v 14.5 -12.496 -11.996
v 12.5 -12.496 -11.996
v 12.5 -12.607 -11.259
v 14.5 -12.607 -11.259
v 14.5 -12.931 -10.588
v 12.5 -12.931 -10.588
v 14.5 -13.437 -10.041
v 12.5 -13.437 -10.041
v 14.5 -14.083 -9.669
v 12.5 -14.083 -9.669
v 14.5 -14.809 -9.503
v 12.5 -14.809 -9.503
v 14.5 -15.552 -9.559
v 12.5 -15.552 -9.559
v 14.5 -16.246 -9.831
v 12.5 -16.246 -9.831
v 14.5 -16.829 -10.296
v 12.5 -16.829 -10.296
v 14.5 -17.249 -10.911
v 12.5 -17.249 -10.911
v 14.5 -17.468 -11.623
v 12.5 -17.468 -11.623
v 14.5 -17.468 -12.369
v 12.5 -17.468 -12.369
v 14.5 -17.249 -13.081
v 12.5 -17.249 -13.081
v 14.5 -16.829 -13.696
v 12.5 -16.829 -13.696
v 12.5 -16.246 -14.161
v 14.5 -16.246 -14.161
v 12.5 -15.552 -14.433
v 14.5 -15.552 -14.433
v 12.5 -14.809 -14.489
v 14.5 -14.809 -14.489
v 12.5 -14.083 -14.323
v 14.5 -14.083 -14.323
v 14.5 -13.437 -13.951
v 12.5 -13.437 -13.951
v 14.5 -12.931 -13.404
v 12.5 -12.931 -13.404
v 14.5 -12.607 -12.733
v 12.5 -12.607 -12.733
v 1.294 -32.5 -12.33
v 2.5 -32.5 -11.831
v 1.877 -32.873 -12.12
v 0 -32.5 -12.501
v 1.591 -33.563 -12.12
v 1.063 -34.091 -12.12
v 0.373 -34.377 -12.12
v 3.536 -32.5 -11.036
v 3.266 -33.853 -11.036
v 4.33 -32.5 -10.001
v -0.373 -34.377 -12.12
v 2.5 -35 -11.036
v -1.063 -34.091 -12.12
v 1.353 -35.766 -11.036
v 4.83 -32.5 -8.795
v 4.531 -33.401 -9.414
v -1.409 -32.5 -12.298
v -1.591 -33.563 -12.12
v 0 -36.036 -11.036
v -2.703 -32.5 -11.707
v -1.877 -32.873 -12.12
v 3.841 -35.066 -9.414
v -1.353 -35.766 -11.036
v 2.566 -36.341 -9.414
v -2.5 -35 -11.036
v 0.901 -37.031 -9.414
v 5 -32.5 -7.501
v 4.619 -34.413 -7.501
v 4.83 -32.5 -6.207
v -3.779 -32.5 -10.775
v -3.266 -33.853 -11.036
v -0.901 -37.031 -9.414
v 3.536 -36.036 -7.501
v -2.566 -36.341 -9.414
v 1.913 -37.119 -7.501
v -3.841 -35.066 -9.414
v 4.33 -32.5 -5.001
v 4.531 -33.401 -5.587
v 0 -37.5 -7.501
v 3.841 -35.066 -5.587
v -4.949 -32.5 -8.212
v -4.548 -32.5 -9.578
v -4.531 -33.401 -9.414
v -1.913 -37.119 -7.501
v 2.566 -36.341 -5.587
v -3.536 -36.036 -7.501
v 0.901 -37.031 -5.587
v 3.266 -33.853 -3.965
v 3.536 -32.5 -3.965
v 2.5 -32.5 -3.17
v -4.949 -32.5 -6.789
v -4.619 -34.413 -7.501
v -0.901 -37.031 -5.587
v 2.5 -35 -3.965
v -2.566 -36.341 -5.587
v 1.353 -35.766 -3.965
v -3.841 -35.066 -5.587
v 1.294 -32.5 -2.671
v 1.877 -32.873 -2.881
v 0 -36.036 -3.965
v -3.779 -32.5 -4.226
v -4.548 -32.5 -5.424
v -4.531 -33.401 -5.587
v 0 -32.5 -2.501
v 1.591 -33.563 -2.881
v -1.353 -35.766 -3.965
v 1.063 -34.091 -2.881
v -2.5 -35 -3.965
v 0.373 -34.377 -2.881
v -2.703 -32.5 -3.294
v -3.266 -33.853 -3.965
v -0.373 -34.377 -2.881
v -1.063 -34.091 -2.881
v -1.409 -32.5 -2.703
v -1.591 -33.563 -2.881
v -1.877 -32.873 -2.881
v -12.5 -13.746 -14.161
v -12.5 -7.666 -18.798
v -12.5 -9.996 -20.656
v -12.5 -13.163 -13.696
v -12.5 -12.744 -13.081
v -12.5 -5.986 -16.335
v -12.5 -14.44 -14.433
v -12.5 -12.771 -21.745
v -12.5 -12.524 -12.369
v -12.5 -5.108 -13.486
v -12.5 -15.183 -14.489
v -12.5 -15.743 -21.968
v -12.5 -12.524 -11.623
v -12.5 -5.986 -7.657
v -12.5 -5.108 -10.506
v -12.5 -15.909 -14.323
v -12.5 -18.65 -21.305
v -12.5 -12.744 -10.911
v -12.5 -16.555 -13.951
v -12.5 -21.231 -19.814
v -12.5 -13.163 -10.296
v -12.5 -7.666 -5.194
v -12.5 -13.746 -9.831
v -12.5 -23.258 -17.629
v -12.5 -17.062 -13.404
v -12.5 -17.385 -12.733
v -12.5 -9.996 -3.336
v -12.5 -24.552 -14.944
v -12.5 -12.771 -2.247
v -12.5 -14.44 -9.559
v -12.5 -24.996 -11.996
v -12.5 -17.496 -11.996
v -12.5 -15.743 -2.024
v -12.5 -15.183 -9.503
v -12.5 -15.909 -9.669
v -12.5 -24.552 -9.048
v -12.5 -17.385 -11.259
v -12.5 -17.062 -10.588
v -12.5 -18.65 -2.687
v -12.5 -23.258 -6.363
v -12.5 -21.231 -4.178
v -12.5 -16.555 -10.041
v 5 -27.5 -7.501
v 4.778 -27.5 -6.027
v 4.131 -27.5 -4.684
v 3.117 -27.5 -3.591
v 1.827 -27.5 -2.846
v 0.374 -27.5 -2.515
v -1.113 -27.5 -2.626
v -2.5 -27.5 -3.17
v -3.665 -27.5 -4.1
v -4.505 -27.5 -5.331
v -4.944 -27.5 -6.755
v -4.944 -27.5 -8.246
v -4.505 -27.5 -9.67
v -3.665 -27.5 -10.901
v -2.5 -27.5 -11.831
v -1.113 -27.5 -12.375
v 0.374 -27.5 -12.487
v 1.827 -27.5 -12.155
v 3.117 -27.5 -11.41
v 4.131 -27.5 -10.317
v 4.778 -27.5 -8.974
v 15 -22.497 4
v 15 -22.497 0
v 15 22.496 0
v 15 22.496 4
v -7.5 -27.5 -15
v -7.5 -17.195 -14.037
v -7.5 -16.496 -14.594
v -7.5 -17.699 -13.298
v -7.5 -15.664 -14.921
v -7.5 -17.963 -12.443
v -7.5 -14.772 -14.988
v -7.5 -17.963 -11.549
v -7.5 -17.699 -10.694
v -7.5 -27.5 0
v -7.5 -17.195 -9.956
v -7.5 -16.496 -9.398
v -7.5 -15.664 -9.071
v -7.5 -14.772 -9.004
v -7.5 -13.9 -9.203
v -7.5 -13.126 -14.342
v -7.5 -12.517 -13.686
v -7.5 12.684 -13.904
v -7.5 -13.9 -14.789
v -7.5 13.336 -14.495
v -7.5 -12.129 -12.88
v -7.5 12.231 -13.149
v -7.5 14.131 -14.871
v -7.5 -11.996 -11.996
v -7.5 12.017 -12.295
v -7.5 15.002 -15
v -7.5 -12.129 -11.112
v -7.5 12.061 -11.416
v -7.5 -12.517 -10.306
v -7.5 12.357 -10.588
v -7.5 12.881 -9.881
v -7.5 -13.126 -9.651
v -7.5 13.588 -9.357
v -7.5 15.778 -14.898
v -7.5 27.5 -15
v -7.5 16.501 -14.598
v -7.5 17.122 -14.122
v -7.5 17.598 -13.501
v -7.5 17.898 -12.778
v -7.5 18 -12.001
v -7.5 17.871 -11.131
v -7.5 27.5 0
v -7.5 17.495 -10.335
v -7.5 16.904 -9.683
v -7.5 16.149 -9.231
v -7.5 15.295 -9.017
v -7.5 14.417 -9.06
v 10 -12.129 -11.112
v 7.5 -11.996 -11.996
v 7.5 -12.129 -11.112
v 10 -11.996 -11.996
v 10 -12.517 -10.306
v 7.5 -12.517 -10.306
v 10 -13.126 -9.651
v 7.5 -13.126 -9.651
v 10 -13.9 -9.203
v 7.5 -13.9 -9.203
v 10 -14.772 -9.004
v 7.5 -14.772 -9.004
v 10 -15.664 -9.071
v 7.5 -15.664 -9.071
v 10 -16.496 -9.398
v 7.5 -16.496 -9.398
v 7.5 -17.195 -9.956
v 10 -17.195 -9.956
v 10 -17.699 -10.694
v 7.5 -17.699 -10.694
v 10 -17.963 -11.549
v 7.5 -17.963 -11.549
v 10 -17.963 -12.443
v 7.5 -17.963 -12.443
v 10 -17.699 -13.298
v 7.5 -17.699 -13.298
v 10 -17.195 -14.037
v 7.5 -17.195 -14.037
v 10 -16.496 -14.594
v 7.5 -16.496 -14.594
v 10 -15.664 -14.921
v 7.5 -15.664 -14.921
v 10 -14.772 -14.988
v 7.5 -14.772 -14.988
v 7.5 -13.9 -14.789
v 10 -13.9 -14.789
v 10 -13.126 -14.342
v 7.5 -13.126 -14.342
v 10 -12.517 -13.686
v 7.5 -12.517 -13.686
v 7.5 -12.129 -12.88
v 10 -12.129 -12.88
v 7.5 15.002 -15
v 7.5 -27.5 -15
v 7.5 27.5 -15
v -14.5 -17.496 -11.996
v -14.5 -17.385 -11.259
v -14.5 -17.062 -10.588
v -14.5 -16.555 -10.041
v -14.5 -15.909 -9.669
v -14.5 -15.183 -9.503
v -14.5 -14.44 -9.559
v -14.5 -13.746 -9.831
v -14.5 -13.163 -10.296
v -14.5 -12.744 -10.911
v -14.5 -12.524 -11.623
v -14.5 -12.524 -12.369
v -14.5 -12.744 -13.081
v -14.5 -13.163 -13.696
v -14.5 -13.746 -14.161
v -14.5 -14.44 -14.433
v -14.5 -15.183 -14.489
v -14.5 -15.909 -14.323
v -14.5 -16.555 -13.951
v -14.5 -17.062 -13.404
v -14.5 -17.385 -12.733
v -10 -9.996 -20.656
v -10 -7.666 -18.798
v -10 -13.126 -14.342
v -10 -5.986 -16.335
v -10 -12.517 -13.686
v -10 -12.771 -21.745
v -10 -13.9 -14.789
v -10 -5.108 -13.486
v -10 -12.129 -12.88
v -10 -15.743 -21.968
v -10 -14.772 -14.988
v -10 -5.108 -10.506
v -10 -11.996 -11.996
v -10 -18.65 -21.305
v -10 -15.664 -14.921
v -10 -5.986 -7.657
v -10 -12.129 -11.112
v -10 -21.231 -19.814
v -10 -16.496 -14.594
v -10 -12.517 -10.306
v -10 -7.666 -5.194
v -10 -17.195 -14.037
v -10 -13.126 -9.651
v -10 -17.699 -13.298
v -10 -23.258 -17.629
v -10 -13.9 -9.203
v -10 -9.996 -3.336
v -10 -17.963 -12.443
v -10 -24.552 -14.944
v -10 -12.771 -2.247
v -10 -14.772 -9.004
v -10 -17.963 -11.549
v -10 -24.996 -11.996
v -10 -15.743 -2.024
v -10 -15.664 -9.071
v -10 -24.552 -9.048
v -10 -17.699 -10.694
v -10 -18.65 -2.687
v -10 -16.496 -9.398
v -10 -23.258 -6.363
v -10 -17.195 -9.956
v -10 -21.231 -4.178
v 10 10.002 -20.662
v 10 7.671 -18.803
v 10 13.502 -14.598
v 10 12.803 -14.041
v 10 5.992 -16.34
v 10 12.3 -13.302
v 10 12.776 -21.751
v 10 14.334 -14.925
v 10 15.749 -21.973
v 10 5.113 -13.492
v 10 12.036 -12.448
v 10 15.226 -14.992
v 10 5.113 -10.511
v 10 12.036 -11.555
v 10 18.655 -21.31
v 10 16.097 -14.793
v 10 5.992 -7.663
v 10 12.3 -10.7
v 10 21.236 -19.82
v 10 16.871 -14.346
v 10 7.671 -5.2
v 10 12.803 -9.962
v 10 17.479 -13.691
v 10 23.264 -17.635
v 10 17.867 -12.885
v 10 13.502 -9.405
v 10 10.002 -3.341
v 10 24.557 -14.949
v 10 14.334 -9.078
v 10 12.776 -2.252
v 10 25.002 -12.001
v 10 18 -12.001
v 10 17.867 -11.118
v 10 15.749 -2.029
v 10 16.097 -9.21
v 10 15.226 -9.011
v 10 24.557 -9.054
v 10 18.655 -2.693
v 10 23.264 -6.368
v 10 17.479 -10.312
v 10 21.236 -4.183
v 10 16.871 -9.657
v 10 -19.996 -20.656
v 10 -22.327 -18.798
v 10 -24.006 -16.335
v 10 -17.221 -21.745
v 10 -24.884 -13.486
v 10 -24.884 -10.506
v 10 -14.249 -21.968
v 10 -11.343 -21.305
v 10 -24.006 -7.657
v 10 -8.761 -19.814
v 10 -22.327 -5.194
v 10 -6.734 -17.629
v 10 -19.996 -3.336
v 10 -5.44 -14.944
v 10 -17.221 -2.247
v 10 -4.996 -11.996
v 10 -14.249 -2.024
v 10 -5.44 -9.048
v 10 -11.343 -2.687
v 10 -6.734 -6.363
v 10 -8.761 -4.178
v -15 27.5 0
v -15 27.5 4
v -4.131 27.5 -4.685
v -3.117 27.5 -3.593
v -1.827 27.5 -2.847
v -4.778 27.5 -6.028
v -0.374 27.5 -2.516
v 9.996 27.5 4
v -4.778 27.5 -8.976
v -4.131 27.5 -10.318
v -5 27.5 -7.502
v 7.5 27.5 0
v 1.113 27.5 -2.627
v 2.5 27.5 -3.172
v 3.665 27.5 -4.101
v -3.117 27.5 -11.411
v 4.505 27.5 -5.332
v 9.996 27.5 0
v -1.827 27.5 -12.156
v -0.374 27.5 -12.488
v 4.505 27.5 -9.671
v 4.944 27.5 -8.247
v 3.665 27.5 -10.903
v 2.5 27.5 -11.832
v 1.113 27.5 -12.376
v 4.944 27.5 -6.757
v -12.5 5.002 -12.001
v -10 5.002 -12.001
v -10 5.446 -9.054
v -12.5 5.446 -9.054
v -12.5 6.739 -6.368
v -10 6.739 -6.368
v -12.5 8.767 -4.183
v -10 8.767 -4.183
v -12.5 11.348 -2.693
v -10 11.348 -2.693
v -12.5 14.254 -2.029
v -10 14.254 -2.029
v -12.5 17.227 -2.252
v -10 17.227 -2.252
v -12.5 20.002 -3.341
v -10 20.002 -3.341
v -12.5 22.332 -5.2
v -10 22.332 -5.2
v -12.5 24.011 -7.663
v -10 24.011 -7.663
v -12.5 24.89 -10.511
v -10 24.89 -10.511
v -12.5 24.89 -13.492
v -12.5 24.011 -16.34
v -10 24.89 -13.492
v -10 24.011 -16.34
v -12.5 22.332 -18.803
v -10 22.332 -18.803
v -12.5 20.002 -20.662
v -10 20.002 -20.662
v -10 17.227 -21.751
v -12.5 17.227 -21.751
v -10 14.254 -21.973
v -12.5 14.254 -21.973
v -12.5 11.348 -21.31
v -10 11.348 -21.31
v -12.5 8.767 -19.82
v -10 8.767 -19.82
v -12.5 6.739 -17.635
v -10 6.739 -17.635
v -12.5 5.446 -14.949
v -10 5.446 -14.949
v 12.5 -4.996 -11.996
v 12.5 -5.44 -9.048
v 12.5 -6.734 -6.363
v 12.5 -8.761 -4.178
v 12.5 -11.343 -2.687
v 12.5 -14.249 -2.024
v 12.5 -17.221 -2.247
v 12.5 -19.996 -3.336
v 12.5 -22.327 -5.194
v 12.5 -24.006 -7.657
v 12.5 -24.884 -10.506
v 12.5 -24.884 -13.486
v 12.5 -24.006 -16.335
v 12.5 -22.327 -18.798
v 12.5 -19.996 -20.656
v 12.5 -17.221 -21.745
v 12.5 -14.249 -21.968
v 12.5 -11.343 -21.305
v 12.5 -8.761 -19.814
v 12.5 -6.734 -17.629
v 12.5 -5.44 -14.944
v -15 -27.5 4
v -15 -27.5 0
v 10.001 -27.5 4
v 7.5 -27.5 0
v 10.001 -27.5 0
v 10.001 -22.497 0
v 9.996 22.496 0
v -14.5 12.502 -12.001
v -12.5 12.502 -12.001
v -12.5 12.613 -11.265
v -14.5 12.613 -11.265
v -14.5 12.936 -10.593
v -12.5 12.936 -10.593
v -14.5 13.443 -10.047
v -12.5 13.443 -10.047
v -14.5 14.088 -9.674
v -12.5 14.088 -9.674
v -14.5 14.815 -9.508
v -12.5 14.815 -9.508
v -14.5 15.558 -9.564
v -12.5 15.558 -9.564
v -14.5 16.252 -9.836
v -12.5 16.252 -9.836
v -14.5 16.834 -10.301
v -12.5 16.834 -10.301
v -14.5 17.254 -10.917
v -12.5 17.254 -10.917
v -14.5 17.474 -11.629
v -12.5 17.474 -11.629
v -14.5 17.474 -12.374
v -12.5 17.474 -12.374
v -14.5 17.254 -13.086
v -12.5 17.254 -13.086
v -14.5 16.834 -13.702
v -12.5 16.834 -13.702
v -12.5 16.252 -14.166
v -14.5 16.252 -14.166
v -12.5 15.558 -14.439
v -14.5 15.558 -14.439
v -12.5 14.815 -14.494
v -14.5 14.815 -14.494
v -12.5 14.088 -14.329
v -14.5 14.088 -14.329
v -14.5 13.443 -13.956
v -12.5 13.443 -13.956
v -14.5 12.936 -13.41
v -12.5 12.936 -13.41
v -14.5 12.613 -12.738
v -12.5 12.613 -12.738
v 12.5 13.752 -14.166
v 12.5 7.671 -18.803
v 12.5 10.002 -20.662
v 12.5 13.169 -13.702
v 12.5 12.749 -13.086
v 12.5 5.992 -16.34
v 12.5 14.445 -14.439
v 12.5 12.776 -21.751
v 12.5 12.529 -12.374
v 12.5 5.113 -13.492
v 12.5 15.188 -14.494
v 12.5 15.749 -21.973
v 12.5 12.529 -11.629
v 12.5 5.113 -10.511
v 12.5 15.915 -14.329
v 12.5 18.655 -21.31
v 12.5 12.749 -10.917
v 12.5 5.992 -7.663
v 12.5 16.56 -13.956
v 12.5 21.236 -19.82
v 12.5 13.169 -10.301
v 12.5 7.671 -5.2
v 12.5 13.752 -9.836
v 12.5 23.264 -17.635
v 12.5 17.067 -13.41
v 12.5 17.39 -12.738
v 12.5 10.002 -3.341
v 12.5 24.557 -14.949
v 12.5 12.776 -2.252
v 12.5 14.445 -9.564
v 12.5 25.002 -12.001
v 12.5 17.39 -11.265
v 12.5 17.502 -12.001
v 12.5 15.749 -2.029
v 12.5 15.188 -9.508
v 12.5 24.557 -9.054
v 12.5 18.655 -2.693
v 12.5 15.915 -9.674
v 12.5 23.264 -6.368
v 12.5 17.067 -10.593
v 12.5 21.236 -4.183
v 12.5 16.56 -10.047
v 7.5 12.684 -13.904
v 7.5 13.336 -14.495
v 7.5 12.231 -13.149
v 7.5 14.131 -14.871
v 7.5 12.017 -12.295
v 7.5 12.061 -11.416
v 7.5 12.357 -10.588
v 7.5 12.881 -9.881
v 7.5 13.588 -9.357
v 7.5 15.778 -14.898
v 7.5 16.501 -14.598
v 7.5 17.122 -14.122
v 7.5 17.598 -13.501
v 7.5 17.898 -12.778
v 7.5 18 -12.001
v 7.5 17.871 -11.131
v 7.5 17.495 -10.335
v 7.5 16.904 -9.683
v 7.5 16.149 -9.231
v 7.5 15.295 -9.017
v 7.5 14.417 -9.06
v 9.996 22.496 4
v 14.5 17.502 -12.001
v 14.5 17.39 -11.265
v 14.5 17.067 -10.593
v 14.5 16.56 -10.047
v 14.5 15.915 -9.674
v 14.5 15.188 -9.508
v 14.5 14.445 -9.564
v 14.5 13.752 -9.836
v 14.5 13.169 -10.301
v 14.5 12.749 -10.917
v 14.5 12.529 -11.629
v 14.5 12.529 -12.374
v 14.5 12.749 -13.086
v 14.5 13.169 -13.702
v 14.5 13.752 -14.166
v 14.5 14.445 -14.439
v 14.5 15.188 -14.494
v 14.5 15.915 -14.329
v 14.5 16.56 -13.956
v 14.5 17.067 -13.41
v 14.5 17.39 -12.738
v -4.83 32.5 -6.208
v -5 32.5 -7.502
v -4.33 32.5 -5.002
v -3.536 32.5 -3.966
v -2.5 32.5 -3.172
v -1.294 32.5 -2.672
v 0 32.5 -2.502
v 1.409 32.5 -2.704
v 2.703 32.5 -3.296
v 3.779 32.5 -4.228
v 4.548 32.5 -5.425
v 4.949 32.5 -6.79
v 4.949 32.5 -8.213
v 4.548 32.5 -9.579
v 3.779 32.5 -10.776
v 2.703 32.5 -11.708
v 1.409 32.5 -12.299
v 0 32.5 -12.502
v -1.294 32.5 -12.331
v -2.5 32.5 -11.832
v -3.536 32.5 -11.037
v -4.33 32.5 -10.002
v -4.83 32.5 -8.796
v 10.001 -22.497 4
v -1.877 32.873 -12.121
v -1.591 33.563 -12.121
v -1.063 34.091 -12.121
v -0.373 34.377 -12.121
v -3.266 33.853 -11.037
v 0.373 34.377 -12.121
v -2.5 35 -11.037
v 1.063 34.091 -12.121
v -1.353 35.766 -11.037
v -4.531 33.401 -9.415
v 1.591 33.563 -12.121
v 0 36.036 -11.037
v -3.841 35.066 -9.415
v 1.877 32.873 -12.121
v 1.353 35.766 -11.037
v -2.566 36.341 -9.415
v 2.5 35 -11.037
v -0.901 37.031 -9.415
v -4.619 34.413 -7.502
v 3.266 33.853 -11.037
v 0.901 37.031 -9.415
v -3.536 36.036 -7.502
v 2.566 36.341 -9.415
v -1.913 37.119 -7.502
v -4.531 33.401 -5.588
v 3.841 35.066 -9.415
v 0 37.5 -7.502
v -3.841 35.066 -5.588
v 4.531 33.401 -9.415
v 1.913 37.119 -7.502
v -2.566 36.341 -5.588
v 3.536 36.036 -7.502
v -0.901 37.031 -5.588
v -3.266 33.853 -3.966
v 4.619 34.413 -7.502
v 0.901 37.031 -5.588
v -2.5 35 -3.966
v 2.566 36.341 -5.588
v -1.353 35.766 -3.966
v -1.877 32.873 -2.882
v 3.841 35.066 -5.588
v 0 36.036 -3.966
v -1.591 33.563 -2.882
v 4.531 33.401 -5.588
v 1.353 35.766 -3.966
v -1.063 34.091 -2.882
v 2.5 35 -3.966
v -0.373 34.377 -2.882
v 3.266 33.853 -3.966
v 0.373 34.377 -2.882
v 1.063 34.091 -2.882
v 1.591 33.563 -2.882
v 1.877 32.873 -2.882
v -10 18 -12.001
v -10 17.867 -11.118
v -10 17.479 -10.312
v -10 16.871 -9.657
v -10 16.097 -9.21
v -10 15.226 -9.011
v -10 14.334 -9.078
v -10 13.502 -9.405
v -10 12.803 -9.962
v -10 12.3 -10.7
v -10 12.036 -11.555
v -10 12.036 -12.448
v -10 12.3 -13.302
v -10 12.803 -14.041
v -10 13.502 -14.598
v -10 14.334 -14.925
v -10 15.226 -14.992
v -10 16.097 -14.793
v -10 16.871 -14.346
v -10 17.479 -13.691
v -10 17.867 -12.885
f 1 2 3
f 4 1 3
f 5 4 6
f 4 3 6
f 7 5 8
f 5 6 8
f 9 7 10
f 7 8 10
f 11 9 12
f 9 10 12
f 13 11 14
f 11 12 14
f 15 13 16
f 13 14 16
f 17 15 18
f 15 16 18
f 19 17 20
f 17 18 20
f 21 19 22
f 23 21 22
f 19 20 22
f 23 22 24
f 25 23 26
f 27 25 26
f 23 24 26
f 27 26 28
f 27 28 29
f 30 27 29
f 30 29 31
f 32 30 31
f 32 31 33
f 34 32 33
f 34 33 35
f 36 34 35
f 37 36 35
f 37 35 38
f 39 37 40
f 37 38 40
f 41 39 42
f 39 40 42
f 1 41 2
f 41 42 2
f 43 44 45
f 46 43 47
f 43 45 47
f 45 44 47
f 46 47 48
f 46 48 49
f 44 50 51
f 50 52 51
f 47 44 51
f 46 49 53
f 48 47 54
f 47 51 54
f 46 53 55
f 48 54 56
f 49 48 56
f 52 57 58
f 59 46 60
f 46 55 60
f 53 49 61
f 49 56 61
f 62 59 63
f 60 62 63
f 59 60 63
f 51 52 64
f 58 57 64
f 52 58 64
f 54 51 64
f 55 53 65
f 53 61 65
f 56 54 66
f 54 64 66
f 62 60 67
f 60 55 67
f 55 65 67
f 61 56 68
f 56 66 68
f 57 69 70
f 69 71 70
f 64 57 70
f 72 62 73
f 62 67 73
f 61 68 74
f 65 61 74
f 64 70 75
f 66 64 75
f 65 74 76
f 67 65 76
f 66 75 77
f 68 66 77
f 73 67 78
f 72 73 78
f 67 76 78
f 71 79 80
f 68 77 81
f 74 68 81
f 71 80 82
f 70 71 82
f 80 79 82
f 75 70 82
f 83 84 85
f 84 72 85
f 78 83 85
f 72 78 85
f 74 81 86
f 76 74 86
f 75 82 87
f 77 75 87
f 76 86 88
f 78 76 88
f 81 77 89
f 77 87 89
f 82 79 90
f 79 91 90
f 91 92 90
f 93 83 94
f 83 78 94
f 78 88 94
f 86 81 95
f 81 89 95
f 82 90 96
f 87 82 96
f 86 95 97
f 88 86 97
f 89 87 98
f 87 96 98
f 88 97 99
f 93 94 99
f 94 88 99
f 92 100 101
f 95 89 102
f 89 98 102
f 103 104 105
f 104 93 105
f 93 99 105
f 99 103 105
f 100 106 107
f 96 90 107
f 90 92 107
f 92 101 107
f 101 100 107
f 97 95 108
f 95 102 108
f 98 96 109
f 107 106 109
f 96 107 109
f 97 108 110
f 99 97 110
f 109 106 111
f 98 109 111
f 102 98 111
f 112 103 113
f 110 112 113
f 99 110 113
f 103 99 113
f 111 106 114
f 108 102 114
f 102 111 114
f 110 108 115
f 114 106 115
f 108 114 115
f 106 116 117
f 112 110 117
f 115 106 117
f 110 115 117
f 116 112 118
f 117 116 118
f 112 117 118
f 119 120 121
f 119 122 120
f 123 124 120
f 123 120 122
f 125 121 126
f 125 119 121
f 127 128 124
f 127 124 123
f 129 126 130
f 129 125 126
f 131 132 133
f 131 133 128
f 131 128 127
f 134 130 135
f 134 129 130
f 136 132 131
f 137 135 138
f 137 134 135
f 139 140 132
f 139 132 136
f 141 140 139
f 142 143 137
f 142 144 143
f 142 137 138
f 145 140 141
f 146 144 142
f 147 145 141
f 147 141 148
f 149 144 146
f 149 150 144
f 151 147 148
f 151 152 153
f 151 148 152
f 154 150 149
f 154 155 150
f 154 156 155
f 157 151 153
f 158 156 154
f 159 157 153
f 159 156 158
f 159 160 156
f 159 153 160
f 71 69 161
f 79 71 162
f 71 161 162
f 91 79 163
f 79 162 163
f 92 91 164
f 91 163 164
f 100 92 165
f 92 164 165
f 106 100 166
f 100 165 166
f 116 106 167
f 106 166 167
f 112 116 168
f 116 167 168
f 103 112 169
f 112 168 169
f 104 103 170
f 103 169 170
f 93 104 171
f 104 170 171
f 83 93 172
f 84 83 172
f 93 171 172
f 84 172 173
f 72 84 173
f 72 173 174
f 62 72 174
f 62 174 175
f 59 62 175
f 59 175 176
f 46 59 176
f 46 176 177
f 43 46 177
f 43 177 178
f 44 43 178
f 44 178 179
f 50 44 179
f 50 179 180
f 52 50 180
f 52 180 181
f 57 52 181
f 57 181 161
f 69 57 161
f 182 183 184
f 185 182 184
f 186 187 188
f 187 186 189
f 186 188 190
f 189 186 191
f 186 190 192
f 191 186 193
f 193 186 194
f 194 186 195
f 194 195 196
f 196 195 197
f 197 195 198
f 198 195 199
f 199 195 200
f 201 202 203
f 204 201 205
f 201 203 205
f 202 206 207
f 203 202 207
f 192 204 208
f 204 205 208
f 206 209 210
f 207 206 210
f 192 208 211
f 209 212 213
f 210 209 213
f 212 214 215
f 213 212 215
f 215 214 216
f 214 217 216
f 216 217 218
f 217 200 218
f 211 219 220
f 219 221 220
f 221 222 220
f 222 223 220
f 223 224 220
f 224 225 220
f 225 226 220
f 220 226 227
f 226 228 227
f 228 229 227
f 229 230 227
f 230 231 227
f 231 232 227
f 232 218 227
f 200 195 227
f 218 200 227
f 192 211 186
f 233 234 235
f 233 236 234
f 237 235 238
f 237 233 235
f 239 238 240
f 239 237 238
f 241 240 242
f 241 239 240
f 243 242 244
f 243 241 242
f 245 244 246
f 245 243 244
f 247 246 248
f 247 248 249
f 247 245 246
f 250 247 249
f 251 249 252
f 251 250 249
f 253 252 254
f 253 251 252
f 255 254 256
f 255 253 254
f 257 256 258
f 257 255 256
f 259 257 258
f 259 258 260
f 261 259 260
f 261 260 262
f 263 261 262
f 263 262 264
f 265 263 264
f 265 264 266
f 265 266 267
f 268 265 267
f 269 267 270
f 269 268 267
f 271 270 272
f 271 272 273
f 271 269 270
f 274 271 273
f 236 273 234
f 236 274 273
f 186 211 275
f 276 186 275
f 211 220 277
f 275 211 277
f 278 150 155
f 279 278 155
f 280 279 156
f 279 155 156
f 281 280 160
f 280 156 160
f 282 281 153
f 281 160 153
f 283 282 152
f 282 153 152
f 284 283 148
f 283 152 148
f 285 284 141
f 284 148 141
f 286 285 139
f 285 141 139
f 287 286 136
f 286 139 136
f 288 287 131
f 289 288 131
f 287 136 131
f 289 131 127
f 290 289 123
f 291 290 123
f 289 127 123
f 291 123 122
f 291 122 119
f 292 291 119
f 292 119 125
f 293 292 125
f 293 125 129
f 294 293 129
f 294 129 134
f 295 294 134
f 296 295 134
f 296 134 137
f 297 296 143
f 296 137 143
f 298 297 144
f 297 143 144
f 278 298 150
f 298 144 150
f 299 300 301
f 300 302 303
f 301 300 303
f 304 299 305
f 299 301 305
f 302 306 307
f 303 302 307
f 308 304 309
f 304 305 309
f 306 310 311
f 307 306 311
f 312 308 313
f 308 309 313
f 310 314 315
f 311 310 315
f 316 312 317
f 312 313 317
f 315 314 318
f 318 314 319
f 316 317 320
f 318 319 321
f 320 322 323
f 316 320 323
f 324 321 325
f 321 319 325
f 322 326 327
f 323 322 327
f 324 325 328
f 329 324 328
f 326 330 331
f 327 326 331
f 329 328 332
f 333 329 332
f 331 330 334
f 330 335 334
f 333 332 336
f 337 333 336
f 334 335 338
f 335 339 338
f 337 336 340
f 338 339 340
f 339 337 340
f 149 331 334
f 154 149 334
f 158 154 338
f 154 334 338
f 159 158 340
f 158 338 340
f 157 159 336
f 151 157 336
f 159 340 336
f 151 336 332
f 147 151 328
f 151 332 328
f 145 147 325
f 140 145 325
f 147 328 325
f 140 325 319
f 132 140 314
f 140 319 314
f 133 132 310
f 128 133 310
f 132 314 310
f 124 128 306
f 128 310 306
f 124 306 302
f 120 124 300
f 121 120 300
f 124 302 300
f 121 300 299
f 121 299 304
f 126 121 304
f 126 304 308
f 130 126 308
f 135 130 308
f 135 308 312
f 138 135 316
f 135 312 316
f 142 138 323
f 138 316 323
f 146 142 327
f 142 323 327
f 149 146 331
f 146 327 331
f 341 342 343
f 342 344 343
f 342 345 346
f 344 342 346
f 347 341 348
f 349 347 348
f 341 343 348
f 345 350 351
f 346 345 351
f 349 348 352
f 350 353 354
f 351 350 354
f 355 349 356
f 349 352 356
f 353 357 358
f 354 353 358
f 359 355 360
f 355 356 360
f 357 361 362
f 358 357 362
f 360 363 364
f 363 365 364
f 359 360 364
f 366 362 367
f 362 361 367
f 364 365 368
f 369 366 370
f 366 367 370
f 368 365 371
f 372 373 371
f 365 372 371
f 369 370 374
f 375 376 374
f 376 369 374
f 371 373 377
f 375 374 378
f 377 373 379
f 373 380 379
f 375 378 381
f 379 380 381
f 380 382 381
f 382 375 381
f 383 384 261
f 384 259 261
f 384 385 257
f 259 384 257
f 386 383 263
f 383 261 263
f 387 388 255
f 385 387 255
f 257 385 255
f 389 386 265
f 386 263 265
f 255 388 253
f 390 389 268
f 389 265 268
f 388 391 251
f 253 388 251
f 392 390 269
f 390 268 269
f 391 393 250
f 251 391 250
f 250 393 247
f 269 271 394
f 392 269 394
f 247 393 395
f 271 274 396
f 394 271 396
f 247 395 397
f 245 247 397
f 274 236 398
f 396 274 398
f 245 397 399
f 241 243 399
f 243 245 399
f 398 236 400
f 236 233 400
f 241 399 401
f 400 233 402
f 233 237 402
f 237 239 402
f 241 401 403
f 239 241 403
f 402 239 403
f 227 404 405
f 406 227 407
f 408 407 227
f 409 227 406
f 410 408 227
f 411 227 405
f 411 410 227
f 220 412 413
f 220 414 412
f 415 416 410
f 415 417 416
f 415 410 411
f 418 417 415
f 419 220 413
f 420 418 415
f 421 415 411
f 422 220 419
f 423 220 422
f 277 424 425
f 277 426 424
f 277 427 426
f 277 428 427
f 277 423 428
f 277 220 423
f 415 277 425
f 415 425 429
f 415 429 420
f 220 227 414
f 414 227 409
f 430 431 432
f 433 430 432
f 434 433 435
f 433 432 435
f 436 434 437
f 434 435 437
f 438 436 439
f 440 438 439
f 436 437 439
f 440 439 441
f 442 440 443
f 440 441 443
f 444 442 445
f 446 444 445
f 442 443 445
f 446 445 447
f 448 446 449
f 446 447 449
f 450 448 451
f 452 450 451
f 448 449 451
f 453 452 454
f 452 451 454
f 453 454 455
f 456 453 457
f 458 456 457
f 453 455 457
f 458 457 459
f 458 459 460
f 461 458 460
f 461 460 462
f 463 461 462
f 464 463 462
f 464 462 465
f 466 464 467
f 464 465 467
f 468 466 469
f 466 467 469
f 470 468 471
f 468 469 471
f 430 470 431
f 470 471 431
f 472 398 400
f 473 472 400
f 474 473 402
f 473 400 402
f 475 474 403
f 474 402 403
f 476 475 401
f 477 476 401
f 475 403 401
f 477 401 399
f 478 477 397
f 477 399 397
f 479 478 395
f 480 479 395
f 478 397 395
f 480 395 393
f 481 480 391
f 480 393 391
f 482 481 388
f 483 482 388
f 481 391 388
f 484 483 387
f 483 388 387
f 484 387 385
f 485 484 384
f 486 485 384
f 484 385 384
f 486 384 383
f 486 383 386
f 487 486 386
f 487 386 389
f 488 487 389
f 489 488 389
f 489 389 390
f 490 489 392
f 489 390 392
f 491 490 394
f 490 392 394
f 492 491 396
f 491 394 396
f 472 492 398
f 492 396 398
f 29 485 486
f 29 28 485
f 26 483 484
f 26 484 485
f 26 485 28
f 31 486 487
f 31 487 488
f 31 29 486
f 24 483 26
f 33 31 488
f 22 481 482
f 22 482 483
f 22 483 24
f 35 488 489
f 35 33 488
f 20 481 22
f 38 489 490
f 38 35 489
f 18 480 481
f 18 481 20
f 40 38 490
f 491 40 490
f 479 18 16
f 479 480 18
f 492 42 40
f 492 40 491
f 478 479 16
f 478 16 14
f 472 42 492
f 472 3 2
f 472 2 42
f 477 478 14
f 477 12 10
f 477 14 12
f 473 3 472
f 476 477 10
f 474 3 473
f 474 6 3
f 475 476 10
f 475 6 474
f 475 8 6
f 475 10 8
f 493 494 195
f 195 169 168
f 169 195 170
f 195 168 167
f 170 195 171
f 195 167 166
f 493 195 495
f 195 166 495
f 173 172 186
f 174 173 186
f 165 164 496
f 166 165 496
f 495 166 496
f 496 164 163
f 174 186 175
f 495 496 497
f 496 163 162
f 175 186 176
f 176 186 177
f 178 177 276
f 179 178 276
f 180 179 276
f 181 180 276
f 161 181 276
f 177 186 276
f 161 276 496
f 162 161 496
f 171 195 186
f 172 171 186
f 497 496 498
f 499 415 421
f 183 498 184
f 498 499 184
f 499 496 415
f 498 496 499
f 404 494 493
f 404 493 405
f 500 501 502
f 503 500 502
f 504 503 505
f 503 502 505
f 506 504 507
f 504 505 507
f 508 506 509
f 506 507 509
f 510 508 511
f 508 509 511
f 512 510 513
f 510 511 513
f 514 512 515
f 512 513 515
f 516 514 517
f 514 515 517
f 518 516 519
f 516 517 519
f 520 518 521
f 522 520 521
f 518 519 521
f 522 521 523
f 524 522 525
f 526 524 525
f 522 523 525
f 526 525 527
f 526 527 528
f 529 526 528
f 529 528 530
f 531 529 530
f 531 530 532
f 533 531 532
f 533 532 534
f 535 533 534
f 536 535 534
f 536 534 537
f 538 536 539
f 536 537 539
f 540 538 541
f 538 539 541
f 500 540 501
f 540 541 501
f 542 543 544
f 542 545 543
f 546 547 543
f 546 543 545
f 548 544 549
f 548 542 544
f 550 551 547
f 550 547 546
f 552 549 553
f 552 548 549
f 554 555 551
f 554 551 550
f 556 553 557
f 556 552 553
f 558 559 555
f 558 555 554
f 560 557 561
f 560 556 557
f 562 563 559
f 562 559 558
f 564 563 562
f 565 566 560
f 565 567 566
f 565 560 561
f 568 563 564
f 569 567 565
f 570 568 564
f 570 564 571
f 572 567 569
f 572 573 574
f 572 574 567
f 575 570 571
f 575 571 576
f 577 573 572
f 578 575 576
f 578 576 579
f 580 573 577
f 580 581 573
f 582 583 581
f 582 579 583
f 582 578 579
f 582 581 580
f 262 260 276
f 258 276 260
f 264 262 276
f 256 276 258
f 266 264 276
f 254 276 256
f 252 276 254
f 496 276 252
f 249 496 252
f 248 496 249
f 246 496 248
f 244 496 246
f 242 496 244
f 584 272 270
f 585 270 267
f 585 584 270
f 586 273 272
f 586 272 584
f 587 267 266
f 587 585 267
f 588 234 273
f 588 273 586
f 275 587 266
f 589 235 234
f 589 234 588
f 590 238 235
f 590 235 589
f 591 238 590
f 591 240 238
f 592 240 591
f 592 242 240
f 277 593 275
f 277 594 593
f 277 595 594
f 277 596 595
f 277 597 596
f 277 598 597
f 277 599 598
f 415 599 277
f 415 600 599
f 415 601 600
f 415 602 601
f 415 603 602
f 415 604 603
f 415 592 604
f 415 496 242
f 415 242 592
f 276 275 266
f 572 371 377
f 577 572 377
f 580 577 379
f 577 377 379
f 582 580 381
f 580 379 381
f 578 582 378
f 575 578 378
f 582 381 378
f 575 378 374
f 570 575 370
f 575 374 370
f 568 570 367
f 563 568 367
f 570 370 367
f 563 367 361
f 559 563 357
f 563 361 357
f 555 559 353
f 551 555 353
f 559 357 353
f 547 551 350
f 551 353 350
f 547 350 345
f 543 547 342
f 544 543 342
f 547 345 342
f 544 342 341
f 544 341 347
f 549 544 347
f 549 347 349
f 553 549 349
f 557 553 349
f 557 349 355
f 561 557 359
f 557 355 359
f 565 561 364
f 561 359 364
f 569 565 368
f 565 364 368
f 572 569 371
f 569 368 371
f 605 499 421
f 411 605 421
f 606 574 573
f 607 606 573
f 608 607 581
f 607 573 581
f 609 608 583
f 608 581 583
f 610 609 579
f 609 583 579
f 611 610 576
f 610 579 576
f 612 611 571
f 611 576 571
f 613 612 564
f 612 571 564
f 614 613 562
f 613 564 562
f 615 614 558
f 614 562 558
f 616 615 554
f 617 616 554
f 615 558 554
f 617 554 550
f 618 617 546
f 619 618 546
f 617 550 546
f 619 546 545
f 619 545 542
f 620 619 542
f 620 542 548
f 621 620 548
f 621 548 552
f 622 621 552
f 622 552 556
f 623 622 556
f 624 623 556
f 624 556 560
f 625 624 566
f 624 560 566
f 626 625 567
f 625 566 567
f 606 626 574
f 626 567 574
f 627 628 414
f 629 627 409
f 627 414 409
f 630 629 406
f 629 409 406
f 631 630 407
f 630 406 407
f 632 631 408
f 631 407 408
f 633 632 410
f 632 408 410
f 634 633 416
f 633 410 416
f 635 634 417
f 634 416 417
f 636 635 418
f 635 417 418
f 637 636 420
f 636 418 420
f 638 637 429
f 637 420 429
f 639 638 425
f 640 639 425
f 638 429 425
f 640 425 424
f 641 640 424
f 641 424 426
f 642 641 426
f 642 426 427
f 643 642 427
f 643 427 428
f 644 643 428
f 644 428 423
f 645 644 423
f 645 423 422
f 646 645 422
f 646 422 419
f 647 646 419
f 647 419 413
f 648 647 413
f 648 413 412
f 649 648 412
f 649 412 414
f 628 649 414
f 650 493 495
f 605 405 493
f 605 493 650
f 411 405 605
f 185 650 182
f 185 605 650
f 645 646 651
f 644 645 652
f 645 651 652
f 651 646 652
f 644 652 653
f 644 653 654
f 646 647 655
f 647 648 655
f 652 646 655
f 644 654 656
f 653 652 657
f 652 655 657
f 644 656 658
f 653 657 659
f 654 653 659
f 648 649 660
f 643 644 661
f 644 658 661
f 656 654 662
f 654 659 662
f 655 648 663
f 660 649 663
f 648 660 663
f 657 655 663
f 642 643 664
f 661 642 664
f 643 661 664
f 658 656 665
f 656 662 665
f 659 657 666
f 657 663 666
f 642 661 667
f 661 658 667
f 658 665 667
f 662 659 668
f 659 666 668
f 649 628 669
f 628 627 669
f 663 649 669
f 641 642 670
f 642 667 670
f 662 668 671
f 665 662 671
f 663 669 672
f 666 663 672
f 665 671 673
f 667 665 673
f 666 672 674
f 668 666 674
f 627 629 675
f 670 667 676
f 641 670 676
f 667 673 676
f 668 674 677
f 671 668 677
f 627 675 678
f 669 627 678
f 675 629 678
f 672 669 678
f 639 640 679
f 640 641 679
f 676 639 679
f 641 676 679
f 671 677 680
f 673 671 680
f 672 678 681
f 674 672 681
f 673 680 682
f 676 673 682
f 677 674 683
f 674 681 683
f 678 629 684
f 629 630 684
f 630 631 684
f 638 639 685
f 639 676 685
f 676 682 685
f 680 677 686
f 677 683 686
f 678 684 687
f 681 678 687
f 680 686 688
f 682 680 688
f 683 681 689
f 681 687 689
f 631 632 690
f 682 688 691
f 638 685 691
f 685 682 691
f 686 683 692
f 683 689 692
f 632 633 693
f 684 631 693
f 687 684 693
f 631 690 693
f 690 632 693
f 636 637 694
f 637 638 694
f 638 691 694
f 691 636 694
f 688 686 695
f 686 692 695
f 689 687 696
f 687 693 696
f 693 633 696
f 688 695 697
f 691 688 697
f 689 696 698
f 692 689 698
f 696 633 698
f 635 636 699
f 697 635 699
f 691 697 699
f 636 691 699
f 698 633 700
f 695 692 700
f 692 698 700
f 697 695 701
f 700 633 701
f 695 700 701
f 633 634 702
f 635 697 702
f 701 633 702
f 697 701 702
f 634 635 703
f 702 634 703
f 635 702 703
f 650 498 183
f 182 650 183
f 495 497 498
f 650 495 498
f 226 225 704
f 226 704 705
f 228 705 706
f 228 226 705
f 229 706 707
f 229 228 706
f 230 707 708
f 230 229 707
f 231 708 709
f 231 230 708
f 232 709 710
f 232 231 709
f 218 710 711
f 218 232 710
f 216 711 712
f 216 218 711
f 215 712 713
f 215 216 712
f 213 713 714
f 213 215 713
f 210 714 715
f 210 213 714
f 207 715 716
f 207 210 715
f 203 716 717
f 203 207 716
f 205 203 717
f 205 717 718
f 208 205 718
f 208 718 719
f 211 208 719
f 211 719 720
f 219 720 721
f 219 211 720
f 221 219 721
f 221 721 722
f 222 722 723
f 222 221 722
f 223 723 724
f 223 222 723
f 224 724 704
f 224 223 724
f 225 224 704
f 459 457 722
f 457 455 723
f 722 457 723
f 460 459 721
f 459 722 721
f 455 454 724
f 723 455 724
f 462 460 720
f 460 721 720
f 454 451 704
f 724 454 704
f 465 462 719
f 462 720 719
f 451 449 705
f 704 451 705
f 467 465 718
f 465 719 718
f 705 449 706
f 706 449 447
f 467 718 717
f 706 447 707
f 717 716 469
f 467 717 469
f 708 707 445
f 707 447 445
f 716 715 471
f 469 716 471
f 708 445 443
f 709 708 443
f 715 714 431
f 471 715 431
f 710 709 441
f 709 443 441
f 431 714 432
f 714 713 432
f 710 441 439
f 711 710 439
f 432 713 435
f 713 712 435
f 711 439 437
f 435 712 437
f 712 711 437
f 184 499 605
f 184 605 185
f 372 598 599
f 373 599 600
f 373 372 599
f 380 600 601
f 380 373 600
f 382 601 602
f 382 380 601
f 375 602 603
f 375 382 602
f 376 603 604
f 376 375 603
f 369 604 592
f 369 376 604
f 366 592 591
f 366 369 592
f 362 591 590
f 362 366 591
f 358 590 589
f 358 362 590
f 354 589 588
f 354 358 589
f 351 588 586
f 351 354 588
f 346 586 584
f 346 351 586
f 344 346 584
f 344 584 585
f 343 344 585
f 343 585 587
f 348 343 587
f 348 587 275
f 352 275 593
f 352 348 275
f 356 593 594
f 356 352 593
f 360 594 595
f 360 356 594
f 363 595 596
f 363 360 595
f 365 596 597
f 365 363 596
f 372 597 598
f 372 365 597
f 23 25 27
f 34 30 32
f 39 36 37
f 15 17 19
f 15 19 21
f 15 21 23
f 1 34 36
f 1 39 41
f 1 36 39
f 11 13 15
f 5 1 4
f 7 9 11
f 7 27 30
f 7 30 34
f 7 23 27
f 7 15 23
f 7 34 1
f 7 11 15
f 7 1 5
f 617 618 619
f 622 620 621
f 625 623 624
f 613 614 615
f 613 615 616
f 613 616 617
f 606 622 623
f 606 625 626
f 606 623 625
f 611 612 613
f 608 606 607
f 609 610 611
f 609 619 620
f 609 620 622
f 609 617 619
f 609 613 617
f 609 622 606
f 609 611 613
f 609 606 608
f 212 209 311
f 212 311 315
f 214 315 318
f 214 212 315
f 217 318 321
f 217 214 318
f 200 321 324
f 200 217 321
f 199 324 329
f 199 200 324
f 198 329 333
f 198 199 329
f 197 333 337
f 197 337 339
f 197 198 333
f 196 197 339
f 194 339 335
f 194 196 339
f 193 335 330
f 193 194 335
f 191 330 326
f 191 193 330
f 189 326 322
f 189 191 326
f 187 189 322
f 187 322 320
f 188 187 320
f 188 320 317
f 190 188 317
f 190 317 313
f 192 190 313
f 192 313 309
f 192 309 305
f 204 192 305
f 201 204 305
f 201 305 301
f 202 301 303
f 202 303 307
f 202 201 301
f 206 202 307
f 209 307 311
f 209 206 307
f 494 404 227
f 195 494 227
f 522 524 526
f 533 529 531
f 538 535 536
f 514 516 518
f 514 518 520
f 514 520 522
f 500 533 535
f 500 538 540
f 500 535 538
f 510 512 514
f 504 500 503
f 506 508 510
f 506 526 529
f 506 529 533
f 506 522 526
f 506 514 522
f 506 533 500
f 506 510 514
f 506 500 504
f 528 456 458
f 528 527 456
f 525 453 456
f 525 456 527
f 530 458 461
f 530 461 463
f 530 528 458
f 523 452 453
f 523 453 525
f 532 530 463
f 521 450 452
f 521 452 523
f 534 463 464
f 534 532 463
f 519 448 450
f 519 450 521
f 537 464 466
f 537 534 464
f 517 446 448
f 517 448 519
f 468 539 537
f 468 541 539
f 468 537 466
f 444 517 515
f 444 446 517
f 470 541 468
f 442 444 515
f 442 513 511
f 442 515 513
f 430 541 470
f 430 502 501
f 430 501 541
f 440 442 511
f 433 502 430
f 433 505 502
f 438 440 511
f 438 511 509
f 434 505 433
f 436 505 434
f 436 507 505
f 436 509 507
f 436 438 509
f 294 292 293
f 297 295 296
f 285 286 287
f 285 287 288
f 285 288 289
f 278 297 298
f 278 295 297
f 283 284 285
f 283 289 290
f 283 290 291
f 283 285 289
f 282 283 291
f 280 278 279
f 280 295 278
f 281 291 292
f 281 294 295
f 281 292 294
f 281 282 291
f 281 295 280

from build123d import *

# Parameters (mm, degrees)
F0_W      = 15
F0_H      = 55
F1_DEPTH  = 15
F2_W      = 30
F2_H      = 55
F3_DEPTH  = 4
F4_W      = 4.9988695979
F4_H      = 5.0033593178
F5_DEPTH  = 25
F6_W      = 5.0042228401
F6_H      = 5.0039739907
F7_DEPTH  = 25
F8_R      = 5
F9_DEPTH  = 5
F10_R     = 5
F11_DEPTH = 5
F12_R     = 3
F13_DEPTH = 10
F14_R     = 2.9985824227
F15_DEPTH = 10
F16_R     = 10
F17_DEPTH = 2.5
F18_R     = 10
F19_DEPTH = 2.5
F20_R     = 10
F21_DEPTH = 2.5
F22_R     = 10
F23_DEPTH = 2.5
F24_R     = 2.5
F25_DEPTH = 2
F26_R     = 2.5
F27_DEPTH = 2
F28_R     = 2.5
F29_DEPTH = 2
F30_R     = 2.5
F31_DEPTH = 2


with BuildPart() as f1:
    # F0 (on Top) → F1 (new body)
    with BuildSketch(Plane.XY):
        Rectangle(F0_W, F0_H)
    extrude(amount=-F1_DEPTH)

    # F2 (on Top) → F3 (join)
    with BuildSketch(Plane.XY):
        Rectangle(F2_W, F2_H)
    extrude(amount=F3_DEPTH)

    # F4 (on Top) → F5 (cut)
    with BuildSketch(Plane.XY):
        with Locations((12.500565201, -24.9983203411)):
            Rectangle(F4_W, F4_H)
    extrude(amount=F5_DEPTH, mode=Mode.SUBTRACT)

    # F6 (on Top) → F7 (cut)
    with BuildSketch(Plane.XY):
        with Locations((12.49788858, 24.9980130047)):
            Rectangle(F6_W, F6_H)
    extrude(amount=F7_DEPTH, mode=Mode.SUBTRACT)

    # F8 (on face) → F9 (join)
    with BuildSketch(Plane.XZ.offset(27.5)):
        with Locations((0, -7.500606589)):
            Circle(F8_R)
    extrude(amount=F9_DEPTH)

    # F10 (on face) → F11 (join)
    with BuildSketch(Plane(origin=(0, 27.5, 0), x_dir=(-1, 0, 0), z_dir=(0, 1, 0))):
        with Locations((0, -7.5018298812)):
            Circle(F10_R)
    extrude(amount=F11_DEPTH)

    # F12 (on Right) → F13 (join, symmetric)
    with BuildSketch(Plane.YZ):
        with Locations((-14.9961104617, -11.996043846)):
            Circle(F12_R)
    extrude(amount=F13_DEPTH, both=True)

    # F14 (on Right) → F15 (join, symmetric)
    with BuildSketch(Plane.YZ):
        with Locations((15.0015540421, -12.0014175773)):
            Circle(F14_R)
    extrude(amount=F15_DEPTH, both=True)

    # F16 (on face) → F17 (join)
    with BuildSketch(Plane.YZ.offset(10)):
        with Locations((-14.9961104617, -11.996043846)):
            Circle(F16_R)
    extrude(amount=F17_DEPTH)

    # F18 (on face) → F19 (join)
    with BuildSketch(Plane.YZ.offset(10)):
        with Locations((15.0015540421, -12.0014175773)):
            Circle(F18_R)
    extrude(amount=F19_DEPTH)

    # F20 (on face) → F21 (join)
    with BuildSketch(Plane(origin=(-10, 0, 0), x_dir=(0, -1, 0), z_dir=(-1, 0, 0))):
        with Locations((-15.0015540421, -12.0014175773)):
            Circle(F20_R)
    extrude(amount=F21_DEPTH)

    # F22 (on face) → F23 (join)
    with BuildSketch(Plane(origin=(-10, 0, 0), x_dir=(0, -1, 0), z_dir=(-1, 0, 0))):
        with Locations((14.9961104617, -11.996043846)):
            Circle(F22_R)
    extrude(amount=F23_DEPTH)

    # F24 (on face) → F25 (join)
    with BuildSketch(Plane.YZ.offset(12.5)):
        with Locations((-14.9961104617, -11.996043846)):
            Circle(F24_R)
    extrude(amount=F25_DEPTH)

    # F26 (on face) → F27 (join)
    with BuildSketch(Plane.YZ.offset(12.5)):
        with Locations((15.0015540421, -12.0014175773)):
            Circle(F26_R)
    extrude(amount=F27_DEPTH)

    # F28 (on face) → F29 (join)
    with BuildSketch(Plane(origin=(-12.5, 0, 0), x_dir=(0, -1, 0), z_dir=(-1, 0, 0))):
        with Locations((14.9961104617, -11.996043846)):
            Circle(F28_R)
    extrude(amount=F29_DEPTH)

    # F30 (on face) → F31 (join)
    with BuildSketch(Plane(origin=(-12.5, 0, 0), x_dir=(0, -1, 0), z_dir=(-1, 0, 0))):
        with Locations((-15.0015540421, -12.0014175773)):
            Circle(F30_R)
    extrude(amount=F31_DEPTH)

    # F32 (on face) → F33 (revolve)
    with BuildSketch(Plane(origin=(0, 32.5, 0), x_dir=(-1, 0, 0), z_dir=(0, 1, 0))):
        with BuildLine():
            Line((0, -2.5018298812), (0, -12.5018298812))
            ThreePointArc((0, -12.5018298812), (5, -7.5018298812), (0, -2.5018298812))
        make_face()
    revolve(axis=Axis((0, 32.5, -7.5018298812), (0, 0, -1)))

    # F34 (on face) → F35 (revolve)
    with BuildSketch(Plane.XZ.offset(32.5)):
        with BuildLine():
            Line((0, -2.500606589), (0, -12.500606589))
            ThreePointArc((0, -12.500606589), (5, -7.500606589), (0, -2.500606589))
        make_face()
    revolve(axis=Axis((0, -32.5, -7.500606589), (0, 0, -1)))


solid = f1.part
